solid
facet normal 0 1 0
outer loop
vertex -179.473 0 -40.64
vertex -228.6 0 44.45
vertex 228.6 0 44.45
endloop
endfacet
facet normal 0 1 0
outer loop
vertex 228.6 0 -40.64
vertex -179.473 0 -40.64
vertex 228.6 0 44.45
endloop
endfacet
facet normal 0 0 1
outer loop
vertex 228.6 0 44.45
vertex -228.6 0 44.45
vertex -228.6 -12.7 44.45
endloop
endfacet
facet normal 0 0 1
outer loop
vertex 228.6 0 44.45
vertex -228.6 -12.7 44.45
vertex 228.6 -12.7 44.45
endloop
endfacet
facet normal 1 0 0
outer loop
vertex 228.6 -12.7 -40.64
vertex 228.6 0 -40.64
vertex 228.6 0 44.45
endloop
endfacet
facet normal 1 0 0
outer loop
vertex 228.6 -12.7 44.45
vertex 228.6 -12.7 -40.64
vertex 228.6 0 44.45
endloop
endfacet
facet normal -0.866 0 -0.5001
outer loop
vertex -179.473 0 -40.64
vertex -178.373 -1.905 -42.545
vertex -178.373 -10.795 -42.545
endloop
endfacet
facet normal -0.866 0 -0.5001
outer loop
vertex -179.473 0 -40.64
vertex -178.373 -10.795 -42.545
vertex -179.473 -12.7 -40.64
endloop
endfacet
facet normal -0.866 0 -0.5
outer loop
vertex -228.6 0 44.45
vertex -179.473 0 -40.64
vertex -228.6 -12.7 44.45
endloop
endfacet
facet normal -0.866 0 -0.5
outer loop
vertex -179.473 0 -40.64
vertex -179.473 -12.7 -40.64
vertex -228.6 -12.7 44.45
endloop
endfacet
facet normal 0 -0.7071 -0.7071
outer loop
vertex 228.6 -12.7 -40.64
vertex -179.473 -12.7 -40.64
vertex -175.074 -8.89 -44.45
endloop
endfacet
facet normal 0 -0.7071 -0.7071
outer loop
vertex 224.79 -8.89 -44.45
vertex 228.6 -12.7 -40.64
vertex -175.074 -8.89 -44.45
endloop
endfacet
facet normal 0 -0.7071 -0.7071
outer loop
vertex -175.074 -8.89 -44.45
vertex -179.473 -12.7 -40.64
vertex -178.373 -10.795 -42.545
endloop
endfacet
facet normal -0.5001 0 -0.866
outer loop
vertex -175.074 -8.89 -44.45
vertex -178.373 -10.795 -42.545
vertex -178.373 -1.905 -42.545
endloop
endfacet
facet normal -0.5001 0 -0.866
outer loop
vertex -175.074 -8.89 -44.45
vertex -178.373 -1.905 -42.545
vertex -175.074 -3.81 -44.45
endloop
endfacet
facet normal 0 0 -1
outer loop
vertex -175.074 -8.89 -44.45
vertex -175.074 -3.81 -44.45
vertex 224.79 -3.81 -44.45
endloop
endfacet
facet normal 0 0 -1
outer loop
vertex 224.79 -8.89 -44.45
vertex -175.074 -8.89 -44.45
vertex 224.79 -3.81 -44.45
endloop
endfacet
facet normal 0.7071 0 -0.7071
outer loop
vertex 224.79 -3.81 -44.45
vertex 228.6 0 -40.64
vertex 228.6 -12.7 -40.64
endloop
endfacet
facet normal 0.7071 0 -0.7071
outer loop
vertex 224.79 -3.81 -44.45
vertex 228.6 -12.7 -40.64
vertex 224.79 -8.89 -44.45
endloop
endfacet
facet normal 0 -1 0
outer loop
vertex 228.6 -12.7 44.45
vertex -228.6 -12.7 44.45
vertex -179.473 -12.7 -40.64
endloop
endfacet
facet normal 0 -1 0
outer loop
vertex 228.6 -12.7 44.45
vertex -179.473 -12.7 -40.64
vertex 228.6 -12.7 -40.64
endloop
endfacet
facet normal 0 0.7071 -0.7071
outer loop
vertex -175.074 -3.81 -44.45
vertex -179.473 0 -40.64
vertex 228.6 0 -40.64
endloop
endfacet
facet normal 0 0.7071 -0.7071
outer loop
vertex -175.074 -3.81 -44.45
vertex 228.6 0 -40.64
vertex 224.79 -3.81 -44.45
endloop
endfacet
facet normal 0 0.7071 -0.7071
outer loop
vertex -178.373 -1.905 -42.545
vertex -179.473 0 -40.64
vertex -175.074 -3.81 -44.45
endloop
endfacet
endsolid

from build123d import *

# Parameters (mm, degrees)
F0_W        = 457.2
F0_H        = 88.9
F1_DEPTH    = 12.7
F3_DEPTH    = 12.701
F4_T1_DEPTH = 425.4697854373
F4_T3_DEPTH = 32.2962243683
F4_T5_DEPTH = 24.3646579033


# Not quite as in the source:
# - a fillet or chamfer that OpenCascade refuses, or shapes differently, is made with other operations: its cross-section is extruded or revolved along the edge and cut away or added
# - a feature names something its author has since deleted; it is built from what else it names


with BuildPart() as f1:
    # F0 (on Front) → F1 (new body)
    with BuildSketch(Plane.XZ):
        Rectangle(F0_W, F0_H)
    extrude(amount=F1_DEPTH)

    # F2 (on face) → F3 (cut, through all)
    with BuildSketch(Plane.XZ.offset(12.7)):
        Polygon((-177.273561069, -44.45), (-228.6, 44.45), (-228.6, -44.45), align=None)
    extrude(amount=-F3_DEPTH, mode=Mode.SUBTRACT)

    # F4: chamfer of 3.81 on 4 edges, made by hand

    # F4_s2 → F4_t1 (cut)
    with BuildSketch(Plane.YZ.offset(-187.0716732532)):
        Polygon((0, -40.64), (-3.81, -44.45), (0, -44.45), align=None)
        Polygon((-12.7, -40.64), (-8.89, -44.45), (-12.7, -44.45), align=None)
    extrude(amount=F4_T1_DEPTH, mode=Mode.SUBTRACT)

    # F4_s4 → F4_t3 (cut)
    with BuildSketch(Plane.XZ.offset(-9.7981121842)):
        Polygon((228.6, -40.64), (224.79, -44.45), (228.6, -44.45), align=None)
    extrude(amount=F4_T3_DEPTH, mode=Mode.SUBTRACT)

    # F4_s6 → F4_t5 (cut)
    with BuildSketch(Plane.XZ.offset(-5.8323289516)):
        Polygon((-178.3734133318, -42.545), (-175.0738565434, -44.45), (-177.273561069, -44.45), align=None)
    extrude(amount=F4_T5_DEPTH, mode=Mode.SUBTRACT)


solid = f1.part
